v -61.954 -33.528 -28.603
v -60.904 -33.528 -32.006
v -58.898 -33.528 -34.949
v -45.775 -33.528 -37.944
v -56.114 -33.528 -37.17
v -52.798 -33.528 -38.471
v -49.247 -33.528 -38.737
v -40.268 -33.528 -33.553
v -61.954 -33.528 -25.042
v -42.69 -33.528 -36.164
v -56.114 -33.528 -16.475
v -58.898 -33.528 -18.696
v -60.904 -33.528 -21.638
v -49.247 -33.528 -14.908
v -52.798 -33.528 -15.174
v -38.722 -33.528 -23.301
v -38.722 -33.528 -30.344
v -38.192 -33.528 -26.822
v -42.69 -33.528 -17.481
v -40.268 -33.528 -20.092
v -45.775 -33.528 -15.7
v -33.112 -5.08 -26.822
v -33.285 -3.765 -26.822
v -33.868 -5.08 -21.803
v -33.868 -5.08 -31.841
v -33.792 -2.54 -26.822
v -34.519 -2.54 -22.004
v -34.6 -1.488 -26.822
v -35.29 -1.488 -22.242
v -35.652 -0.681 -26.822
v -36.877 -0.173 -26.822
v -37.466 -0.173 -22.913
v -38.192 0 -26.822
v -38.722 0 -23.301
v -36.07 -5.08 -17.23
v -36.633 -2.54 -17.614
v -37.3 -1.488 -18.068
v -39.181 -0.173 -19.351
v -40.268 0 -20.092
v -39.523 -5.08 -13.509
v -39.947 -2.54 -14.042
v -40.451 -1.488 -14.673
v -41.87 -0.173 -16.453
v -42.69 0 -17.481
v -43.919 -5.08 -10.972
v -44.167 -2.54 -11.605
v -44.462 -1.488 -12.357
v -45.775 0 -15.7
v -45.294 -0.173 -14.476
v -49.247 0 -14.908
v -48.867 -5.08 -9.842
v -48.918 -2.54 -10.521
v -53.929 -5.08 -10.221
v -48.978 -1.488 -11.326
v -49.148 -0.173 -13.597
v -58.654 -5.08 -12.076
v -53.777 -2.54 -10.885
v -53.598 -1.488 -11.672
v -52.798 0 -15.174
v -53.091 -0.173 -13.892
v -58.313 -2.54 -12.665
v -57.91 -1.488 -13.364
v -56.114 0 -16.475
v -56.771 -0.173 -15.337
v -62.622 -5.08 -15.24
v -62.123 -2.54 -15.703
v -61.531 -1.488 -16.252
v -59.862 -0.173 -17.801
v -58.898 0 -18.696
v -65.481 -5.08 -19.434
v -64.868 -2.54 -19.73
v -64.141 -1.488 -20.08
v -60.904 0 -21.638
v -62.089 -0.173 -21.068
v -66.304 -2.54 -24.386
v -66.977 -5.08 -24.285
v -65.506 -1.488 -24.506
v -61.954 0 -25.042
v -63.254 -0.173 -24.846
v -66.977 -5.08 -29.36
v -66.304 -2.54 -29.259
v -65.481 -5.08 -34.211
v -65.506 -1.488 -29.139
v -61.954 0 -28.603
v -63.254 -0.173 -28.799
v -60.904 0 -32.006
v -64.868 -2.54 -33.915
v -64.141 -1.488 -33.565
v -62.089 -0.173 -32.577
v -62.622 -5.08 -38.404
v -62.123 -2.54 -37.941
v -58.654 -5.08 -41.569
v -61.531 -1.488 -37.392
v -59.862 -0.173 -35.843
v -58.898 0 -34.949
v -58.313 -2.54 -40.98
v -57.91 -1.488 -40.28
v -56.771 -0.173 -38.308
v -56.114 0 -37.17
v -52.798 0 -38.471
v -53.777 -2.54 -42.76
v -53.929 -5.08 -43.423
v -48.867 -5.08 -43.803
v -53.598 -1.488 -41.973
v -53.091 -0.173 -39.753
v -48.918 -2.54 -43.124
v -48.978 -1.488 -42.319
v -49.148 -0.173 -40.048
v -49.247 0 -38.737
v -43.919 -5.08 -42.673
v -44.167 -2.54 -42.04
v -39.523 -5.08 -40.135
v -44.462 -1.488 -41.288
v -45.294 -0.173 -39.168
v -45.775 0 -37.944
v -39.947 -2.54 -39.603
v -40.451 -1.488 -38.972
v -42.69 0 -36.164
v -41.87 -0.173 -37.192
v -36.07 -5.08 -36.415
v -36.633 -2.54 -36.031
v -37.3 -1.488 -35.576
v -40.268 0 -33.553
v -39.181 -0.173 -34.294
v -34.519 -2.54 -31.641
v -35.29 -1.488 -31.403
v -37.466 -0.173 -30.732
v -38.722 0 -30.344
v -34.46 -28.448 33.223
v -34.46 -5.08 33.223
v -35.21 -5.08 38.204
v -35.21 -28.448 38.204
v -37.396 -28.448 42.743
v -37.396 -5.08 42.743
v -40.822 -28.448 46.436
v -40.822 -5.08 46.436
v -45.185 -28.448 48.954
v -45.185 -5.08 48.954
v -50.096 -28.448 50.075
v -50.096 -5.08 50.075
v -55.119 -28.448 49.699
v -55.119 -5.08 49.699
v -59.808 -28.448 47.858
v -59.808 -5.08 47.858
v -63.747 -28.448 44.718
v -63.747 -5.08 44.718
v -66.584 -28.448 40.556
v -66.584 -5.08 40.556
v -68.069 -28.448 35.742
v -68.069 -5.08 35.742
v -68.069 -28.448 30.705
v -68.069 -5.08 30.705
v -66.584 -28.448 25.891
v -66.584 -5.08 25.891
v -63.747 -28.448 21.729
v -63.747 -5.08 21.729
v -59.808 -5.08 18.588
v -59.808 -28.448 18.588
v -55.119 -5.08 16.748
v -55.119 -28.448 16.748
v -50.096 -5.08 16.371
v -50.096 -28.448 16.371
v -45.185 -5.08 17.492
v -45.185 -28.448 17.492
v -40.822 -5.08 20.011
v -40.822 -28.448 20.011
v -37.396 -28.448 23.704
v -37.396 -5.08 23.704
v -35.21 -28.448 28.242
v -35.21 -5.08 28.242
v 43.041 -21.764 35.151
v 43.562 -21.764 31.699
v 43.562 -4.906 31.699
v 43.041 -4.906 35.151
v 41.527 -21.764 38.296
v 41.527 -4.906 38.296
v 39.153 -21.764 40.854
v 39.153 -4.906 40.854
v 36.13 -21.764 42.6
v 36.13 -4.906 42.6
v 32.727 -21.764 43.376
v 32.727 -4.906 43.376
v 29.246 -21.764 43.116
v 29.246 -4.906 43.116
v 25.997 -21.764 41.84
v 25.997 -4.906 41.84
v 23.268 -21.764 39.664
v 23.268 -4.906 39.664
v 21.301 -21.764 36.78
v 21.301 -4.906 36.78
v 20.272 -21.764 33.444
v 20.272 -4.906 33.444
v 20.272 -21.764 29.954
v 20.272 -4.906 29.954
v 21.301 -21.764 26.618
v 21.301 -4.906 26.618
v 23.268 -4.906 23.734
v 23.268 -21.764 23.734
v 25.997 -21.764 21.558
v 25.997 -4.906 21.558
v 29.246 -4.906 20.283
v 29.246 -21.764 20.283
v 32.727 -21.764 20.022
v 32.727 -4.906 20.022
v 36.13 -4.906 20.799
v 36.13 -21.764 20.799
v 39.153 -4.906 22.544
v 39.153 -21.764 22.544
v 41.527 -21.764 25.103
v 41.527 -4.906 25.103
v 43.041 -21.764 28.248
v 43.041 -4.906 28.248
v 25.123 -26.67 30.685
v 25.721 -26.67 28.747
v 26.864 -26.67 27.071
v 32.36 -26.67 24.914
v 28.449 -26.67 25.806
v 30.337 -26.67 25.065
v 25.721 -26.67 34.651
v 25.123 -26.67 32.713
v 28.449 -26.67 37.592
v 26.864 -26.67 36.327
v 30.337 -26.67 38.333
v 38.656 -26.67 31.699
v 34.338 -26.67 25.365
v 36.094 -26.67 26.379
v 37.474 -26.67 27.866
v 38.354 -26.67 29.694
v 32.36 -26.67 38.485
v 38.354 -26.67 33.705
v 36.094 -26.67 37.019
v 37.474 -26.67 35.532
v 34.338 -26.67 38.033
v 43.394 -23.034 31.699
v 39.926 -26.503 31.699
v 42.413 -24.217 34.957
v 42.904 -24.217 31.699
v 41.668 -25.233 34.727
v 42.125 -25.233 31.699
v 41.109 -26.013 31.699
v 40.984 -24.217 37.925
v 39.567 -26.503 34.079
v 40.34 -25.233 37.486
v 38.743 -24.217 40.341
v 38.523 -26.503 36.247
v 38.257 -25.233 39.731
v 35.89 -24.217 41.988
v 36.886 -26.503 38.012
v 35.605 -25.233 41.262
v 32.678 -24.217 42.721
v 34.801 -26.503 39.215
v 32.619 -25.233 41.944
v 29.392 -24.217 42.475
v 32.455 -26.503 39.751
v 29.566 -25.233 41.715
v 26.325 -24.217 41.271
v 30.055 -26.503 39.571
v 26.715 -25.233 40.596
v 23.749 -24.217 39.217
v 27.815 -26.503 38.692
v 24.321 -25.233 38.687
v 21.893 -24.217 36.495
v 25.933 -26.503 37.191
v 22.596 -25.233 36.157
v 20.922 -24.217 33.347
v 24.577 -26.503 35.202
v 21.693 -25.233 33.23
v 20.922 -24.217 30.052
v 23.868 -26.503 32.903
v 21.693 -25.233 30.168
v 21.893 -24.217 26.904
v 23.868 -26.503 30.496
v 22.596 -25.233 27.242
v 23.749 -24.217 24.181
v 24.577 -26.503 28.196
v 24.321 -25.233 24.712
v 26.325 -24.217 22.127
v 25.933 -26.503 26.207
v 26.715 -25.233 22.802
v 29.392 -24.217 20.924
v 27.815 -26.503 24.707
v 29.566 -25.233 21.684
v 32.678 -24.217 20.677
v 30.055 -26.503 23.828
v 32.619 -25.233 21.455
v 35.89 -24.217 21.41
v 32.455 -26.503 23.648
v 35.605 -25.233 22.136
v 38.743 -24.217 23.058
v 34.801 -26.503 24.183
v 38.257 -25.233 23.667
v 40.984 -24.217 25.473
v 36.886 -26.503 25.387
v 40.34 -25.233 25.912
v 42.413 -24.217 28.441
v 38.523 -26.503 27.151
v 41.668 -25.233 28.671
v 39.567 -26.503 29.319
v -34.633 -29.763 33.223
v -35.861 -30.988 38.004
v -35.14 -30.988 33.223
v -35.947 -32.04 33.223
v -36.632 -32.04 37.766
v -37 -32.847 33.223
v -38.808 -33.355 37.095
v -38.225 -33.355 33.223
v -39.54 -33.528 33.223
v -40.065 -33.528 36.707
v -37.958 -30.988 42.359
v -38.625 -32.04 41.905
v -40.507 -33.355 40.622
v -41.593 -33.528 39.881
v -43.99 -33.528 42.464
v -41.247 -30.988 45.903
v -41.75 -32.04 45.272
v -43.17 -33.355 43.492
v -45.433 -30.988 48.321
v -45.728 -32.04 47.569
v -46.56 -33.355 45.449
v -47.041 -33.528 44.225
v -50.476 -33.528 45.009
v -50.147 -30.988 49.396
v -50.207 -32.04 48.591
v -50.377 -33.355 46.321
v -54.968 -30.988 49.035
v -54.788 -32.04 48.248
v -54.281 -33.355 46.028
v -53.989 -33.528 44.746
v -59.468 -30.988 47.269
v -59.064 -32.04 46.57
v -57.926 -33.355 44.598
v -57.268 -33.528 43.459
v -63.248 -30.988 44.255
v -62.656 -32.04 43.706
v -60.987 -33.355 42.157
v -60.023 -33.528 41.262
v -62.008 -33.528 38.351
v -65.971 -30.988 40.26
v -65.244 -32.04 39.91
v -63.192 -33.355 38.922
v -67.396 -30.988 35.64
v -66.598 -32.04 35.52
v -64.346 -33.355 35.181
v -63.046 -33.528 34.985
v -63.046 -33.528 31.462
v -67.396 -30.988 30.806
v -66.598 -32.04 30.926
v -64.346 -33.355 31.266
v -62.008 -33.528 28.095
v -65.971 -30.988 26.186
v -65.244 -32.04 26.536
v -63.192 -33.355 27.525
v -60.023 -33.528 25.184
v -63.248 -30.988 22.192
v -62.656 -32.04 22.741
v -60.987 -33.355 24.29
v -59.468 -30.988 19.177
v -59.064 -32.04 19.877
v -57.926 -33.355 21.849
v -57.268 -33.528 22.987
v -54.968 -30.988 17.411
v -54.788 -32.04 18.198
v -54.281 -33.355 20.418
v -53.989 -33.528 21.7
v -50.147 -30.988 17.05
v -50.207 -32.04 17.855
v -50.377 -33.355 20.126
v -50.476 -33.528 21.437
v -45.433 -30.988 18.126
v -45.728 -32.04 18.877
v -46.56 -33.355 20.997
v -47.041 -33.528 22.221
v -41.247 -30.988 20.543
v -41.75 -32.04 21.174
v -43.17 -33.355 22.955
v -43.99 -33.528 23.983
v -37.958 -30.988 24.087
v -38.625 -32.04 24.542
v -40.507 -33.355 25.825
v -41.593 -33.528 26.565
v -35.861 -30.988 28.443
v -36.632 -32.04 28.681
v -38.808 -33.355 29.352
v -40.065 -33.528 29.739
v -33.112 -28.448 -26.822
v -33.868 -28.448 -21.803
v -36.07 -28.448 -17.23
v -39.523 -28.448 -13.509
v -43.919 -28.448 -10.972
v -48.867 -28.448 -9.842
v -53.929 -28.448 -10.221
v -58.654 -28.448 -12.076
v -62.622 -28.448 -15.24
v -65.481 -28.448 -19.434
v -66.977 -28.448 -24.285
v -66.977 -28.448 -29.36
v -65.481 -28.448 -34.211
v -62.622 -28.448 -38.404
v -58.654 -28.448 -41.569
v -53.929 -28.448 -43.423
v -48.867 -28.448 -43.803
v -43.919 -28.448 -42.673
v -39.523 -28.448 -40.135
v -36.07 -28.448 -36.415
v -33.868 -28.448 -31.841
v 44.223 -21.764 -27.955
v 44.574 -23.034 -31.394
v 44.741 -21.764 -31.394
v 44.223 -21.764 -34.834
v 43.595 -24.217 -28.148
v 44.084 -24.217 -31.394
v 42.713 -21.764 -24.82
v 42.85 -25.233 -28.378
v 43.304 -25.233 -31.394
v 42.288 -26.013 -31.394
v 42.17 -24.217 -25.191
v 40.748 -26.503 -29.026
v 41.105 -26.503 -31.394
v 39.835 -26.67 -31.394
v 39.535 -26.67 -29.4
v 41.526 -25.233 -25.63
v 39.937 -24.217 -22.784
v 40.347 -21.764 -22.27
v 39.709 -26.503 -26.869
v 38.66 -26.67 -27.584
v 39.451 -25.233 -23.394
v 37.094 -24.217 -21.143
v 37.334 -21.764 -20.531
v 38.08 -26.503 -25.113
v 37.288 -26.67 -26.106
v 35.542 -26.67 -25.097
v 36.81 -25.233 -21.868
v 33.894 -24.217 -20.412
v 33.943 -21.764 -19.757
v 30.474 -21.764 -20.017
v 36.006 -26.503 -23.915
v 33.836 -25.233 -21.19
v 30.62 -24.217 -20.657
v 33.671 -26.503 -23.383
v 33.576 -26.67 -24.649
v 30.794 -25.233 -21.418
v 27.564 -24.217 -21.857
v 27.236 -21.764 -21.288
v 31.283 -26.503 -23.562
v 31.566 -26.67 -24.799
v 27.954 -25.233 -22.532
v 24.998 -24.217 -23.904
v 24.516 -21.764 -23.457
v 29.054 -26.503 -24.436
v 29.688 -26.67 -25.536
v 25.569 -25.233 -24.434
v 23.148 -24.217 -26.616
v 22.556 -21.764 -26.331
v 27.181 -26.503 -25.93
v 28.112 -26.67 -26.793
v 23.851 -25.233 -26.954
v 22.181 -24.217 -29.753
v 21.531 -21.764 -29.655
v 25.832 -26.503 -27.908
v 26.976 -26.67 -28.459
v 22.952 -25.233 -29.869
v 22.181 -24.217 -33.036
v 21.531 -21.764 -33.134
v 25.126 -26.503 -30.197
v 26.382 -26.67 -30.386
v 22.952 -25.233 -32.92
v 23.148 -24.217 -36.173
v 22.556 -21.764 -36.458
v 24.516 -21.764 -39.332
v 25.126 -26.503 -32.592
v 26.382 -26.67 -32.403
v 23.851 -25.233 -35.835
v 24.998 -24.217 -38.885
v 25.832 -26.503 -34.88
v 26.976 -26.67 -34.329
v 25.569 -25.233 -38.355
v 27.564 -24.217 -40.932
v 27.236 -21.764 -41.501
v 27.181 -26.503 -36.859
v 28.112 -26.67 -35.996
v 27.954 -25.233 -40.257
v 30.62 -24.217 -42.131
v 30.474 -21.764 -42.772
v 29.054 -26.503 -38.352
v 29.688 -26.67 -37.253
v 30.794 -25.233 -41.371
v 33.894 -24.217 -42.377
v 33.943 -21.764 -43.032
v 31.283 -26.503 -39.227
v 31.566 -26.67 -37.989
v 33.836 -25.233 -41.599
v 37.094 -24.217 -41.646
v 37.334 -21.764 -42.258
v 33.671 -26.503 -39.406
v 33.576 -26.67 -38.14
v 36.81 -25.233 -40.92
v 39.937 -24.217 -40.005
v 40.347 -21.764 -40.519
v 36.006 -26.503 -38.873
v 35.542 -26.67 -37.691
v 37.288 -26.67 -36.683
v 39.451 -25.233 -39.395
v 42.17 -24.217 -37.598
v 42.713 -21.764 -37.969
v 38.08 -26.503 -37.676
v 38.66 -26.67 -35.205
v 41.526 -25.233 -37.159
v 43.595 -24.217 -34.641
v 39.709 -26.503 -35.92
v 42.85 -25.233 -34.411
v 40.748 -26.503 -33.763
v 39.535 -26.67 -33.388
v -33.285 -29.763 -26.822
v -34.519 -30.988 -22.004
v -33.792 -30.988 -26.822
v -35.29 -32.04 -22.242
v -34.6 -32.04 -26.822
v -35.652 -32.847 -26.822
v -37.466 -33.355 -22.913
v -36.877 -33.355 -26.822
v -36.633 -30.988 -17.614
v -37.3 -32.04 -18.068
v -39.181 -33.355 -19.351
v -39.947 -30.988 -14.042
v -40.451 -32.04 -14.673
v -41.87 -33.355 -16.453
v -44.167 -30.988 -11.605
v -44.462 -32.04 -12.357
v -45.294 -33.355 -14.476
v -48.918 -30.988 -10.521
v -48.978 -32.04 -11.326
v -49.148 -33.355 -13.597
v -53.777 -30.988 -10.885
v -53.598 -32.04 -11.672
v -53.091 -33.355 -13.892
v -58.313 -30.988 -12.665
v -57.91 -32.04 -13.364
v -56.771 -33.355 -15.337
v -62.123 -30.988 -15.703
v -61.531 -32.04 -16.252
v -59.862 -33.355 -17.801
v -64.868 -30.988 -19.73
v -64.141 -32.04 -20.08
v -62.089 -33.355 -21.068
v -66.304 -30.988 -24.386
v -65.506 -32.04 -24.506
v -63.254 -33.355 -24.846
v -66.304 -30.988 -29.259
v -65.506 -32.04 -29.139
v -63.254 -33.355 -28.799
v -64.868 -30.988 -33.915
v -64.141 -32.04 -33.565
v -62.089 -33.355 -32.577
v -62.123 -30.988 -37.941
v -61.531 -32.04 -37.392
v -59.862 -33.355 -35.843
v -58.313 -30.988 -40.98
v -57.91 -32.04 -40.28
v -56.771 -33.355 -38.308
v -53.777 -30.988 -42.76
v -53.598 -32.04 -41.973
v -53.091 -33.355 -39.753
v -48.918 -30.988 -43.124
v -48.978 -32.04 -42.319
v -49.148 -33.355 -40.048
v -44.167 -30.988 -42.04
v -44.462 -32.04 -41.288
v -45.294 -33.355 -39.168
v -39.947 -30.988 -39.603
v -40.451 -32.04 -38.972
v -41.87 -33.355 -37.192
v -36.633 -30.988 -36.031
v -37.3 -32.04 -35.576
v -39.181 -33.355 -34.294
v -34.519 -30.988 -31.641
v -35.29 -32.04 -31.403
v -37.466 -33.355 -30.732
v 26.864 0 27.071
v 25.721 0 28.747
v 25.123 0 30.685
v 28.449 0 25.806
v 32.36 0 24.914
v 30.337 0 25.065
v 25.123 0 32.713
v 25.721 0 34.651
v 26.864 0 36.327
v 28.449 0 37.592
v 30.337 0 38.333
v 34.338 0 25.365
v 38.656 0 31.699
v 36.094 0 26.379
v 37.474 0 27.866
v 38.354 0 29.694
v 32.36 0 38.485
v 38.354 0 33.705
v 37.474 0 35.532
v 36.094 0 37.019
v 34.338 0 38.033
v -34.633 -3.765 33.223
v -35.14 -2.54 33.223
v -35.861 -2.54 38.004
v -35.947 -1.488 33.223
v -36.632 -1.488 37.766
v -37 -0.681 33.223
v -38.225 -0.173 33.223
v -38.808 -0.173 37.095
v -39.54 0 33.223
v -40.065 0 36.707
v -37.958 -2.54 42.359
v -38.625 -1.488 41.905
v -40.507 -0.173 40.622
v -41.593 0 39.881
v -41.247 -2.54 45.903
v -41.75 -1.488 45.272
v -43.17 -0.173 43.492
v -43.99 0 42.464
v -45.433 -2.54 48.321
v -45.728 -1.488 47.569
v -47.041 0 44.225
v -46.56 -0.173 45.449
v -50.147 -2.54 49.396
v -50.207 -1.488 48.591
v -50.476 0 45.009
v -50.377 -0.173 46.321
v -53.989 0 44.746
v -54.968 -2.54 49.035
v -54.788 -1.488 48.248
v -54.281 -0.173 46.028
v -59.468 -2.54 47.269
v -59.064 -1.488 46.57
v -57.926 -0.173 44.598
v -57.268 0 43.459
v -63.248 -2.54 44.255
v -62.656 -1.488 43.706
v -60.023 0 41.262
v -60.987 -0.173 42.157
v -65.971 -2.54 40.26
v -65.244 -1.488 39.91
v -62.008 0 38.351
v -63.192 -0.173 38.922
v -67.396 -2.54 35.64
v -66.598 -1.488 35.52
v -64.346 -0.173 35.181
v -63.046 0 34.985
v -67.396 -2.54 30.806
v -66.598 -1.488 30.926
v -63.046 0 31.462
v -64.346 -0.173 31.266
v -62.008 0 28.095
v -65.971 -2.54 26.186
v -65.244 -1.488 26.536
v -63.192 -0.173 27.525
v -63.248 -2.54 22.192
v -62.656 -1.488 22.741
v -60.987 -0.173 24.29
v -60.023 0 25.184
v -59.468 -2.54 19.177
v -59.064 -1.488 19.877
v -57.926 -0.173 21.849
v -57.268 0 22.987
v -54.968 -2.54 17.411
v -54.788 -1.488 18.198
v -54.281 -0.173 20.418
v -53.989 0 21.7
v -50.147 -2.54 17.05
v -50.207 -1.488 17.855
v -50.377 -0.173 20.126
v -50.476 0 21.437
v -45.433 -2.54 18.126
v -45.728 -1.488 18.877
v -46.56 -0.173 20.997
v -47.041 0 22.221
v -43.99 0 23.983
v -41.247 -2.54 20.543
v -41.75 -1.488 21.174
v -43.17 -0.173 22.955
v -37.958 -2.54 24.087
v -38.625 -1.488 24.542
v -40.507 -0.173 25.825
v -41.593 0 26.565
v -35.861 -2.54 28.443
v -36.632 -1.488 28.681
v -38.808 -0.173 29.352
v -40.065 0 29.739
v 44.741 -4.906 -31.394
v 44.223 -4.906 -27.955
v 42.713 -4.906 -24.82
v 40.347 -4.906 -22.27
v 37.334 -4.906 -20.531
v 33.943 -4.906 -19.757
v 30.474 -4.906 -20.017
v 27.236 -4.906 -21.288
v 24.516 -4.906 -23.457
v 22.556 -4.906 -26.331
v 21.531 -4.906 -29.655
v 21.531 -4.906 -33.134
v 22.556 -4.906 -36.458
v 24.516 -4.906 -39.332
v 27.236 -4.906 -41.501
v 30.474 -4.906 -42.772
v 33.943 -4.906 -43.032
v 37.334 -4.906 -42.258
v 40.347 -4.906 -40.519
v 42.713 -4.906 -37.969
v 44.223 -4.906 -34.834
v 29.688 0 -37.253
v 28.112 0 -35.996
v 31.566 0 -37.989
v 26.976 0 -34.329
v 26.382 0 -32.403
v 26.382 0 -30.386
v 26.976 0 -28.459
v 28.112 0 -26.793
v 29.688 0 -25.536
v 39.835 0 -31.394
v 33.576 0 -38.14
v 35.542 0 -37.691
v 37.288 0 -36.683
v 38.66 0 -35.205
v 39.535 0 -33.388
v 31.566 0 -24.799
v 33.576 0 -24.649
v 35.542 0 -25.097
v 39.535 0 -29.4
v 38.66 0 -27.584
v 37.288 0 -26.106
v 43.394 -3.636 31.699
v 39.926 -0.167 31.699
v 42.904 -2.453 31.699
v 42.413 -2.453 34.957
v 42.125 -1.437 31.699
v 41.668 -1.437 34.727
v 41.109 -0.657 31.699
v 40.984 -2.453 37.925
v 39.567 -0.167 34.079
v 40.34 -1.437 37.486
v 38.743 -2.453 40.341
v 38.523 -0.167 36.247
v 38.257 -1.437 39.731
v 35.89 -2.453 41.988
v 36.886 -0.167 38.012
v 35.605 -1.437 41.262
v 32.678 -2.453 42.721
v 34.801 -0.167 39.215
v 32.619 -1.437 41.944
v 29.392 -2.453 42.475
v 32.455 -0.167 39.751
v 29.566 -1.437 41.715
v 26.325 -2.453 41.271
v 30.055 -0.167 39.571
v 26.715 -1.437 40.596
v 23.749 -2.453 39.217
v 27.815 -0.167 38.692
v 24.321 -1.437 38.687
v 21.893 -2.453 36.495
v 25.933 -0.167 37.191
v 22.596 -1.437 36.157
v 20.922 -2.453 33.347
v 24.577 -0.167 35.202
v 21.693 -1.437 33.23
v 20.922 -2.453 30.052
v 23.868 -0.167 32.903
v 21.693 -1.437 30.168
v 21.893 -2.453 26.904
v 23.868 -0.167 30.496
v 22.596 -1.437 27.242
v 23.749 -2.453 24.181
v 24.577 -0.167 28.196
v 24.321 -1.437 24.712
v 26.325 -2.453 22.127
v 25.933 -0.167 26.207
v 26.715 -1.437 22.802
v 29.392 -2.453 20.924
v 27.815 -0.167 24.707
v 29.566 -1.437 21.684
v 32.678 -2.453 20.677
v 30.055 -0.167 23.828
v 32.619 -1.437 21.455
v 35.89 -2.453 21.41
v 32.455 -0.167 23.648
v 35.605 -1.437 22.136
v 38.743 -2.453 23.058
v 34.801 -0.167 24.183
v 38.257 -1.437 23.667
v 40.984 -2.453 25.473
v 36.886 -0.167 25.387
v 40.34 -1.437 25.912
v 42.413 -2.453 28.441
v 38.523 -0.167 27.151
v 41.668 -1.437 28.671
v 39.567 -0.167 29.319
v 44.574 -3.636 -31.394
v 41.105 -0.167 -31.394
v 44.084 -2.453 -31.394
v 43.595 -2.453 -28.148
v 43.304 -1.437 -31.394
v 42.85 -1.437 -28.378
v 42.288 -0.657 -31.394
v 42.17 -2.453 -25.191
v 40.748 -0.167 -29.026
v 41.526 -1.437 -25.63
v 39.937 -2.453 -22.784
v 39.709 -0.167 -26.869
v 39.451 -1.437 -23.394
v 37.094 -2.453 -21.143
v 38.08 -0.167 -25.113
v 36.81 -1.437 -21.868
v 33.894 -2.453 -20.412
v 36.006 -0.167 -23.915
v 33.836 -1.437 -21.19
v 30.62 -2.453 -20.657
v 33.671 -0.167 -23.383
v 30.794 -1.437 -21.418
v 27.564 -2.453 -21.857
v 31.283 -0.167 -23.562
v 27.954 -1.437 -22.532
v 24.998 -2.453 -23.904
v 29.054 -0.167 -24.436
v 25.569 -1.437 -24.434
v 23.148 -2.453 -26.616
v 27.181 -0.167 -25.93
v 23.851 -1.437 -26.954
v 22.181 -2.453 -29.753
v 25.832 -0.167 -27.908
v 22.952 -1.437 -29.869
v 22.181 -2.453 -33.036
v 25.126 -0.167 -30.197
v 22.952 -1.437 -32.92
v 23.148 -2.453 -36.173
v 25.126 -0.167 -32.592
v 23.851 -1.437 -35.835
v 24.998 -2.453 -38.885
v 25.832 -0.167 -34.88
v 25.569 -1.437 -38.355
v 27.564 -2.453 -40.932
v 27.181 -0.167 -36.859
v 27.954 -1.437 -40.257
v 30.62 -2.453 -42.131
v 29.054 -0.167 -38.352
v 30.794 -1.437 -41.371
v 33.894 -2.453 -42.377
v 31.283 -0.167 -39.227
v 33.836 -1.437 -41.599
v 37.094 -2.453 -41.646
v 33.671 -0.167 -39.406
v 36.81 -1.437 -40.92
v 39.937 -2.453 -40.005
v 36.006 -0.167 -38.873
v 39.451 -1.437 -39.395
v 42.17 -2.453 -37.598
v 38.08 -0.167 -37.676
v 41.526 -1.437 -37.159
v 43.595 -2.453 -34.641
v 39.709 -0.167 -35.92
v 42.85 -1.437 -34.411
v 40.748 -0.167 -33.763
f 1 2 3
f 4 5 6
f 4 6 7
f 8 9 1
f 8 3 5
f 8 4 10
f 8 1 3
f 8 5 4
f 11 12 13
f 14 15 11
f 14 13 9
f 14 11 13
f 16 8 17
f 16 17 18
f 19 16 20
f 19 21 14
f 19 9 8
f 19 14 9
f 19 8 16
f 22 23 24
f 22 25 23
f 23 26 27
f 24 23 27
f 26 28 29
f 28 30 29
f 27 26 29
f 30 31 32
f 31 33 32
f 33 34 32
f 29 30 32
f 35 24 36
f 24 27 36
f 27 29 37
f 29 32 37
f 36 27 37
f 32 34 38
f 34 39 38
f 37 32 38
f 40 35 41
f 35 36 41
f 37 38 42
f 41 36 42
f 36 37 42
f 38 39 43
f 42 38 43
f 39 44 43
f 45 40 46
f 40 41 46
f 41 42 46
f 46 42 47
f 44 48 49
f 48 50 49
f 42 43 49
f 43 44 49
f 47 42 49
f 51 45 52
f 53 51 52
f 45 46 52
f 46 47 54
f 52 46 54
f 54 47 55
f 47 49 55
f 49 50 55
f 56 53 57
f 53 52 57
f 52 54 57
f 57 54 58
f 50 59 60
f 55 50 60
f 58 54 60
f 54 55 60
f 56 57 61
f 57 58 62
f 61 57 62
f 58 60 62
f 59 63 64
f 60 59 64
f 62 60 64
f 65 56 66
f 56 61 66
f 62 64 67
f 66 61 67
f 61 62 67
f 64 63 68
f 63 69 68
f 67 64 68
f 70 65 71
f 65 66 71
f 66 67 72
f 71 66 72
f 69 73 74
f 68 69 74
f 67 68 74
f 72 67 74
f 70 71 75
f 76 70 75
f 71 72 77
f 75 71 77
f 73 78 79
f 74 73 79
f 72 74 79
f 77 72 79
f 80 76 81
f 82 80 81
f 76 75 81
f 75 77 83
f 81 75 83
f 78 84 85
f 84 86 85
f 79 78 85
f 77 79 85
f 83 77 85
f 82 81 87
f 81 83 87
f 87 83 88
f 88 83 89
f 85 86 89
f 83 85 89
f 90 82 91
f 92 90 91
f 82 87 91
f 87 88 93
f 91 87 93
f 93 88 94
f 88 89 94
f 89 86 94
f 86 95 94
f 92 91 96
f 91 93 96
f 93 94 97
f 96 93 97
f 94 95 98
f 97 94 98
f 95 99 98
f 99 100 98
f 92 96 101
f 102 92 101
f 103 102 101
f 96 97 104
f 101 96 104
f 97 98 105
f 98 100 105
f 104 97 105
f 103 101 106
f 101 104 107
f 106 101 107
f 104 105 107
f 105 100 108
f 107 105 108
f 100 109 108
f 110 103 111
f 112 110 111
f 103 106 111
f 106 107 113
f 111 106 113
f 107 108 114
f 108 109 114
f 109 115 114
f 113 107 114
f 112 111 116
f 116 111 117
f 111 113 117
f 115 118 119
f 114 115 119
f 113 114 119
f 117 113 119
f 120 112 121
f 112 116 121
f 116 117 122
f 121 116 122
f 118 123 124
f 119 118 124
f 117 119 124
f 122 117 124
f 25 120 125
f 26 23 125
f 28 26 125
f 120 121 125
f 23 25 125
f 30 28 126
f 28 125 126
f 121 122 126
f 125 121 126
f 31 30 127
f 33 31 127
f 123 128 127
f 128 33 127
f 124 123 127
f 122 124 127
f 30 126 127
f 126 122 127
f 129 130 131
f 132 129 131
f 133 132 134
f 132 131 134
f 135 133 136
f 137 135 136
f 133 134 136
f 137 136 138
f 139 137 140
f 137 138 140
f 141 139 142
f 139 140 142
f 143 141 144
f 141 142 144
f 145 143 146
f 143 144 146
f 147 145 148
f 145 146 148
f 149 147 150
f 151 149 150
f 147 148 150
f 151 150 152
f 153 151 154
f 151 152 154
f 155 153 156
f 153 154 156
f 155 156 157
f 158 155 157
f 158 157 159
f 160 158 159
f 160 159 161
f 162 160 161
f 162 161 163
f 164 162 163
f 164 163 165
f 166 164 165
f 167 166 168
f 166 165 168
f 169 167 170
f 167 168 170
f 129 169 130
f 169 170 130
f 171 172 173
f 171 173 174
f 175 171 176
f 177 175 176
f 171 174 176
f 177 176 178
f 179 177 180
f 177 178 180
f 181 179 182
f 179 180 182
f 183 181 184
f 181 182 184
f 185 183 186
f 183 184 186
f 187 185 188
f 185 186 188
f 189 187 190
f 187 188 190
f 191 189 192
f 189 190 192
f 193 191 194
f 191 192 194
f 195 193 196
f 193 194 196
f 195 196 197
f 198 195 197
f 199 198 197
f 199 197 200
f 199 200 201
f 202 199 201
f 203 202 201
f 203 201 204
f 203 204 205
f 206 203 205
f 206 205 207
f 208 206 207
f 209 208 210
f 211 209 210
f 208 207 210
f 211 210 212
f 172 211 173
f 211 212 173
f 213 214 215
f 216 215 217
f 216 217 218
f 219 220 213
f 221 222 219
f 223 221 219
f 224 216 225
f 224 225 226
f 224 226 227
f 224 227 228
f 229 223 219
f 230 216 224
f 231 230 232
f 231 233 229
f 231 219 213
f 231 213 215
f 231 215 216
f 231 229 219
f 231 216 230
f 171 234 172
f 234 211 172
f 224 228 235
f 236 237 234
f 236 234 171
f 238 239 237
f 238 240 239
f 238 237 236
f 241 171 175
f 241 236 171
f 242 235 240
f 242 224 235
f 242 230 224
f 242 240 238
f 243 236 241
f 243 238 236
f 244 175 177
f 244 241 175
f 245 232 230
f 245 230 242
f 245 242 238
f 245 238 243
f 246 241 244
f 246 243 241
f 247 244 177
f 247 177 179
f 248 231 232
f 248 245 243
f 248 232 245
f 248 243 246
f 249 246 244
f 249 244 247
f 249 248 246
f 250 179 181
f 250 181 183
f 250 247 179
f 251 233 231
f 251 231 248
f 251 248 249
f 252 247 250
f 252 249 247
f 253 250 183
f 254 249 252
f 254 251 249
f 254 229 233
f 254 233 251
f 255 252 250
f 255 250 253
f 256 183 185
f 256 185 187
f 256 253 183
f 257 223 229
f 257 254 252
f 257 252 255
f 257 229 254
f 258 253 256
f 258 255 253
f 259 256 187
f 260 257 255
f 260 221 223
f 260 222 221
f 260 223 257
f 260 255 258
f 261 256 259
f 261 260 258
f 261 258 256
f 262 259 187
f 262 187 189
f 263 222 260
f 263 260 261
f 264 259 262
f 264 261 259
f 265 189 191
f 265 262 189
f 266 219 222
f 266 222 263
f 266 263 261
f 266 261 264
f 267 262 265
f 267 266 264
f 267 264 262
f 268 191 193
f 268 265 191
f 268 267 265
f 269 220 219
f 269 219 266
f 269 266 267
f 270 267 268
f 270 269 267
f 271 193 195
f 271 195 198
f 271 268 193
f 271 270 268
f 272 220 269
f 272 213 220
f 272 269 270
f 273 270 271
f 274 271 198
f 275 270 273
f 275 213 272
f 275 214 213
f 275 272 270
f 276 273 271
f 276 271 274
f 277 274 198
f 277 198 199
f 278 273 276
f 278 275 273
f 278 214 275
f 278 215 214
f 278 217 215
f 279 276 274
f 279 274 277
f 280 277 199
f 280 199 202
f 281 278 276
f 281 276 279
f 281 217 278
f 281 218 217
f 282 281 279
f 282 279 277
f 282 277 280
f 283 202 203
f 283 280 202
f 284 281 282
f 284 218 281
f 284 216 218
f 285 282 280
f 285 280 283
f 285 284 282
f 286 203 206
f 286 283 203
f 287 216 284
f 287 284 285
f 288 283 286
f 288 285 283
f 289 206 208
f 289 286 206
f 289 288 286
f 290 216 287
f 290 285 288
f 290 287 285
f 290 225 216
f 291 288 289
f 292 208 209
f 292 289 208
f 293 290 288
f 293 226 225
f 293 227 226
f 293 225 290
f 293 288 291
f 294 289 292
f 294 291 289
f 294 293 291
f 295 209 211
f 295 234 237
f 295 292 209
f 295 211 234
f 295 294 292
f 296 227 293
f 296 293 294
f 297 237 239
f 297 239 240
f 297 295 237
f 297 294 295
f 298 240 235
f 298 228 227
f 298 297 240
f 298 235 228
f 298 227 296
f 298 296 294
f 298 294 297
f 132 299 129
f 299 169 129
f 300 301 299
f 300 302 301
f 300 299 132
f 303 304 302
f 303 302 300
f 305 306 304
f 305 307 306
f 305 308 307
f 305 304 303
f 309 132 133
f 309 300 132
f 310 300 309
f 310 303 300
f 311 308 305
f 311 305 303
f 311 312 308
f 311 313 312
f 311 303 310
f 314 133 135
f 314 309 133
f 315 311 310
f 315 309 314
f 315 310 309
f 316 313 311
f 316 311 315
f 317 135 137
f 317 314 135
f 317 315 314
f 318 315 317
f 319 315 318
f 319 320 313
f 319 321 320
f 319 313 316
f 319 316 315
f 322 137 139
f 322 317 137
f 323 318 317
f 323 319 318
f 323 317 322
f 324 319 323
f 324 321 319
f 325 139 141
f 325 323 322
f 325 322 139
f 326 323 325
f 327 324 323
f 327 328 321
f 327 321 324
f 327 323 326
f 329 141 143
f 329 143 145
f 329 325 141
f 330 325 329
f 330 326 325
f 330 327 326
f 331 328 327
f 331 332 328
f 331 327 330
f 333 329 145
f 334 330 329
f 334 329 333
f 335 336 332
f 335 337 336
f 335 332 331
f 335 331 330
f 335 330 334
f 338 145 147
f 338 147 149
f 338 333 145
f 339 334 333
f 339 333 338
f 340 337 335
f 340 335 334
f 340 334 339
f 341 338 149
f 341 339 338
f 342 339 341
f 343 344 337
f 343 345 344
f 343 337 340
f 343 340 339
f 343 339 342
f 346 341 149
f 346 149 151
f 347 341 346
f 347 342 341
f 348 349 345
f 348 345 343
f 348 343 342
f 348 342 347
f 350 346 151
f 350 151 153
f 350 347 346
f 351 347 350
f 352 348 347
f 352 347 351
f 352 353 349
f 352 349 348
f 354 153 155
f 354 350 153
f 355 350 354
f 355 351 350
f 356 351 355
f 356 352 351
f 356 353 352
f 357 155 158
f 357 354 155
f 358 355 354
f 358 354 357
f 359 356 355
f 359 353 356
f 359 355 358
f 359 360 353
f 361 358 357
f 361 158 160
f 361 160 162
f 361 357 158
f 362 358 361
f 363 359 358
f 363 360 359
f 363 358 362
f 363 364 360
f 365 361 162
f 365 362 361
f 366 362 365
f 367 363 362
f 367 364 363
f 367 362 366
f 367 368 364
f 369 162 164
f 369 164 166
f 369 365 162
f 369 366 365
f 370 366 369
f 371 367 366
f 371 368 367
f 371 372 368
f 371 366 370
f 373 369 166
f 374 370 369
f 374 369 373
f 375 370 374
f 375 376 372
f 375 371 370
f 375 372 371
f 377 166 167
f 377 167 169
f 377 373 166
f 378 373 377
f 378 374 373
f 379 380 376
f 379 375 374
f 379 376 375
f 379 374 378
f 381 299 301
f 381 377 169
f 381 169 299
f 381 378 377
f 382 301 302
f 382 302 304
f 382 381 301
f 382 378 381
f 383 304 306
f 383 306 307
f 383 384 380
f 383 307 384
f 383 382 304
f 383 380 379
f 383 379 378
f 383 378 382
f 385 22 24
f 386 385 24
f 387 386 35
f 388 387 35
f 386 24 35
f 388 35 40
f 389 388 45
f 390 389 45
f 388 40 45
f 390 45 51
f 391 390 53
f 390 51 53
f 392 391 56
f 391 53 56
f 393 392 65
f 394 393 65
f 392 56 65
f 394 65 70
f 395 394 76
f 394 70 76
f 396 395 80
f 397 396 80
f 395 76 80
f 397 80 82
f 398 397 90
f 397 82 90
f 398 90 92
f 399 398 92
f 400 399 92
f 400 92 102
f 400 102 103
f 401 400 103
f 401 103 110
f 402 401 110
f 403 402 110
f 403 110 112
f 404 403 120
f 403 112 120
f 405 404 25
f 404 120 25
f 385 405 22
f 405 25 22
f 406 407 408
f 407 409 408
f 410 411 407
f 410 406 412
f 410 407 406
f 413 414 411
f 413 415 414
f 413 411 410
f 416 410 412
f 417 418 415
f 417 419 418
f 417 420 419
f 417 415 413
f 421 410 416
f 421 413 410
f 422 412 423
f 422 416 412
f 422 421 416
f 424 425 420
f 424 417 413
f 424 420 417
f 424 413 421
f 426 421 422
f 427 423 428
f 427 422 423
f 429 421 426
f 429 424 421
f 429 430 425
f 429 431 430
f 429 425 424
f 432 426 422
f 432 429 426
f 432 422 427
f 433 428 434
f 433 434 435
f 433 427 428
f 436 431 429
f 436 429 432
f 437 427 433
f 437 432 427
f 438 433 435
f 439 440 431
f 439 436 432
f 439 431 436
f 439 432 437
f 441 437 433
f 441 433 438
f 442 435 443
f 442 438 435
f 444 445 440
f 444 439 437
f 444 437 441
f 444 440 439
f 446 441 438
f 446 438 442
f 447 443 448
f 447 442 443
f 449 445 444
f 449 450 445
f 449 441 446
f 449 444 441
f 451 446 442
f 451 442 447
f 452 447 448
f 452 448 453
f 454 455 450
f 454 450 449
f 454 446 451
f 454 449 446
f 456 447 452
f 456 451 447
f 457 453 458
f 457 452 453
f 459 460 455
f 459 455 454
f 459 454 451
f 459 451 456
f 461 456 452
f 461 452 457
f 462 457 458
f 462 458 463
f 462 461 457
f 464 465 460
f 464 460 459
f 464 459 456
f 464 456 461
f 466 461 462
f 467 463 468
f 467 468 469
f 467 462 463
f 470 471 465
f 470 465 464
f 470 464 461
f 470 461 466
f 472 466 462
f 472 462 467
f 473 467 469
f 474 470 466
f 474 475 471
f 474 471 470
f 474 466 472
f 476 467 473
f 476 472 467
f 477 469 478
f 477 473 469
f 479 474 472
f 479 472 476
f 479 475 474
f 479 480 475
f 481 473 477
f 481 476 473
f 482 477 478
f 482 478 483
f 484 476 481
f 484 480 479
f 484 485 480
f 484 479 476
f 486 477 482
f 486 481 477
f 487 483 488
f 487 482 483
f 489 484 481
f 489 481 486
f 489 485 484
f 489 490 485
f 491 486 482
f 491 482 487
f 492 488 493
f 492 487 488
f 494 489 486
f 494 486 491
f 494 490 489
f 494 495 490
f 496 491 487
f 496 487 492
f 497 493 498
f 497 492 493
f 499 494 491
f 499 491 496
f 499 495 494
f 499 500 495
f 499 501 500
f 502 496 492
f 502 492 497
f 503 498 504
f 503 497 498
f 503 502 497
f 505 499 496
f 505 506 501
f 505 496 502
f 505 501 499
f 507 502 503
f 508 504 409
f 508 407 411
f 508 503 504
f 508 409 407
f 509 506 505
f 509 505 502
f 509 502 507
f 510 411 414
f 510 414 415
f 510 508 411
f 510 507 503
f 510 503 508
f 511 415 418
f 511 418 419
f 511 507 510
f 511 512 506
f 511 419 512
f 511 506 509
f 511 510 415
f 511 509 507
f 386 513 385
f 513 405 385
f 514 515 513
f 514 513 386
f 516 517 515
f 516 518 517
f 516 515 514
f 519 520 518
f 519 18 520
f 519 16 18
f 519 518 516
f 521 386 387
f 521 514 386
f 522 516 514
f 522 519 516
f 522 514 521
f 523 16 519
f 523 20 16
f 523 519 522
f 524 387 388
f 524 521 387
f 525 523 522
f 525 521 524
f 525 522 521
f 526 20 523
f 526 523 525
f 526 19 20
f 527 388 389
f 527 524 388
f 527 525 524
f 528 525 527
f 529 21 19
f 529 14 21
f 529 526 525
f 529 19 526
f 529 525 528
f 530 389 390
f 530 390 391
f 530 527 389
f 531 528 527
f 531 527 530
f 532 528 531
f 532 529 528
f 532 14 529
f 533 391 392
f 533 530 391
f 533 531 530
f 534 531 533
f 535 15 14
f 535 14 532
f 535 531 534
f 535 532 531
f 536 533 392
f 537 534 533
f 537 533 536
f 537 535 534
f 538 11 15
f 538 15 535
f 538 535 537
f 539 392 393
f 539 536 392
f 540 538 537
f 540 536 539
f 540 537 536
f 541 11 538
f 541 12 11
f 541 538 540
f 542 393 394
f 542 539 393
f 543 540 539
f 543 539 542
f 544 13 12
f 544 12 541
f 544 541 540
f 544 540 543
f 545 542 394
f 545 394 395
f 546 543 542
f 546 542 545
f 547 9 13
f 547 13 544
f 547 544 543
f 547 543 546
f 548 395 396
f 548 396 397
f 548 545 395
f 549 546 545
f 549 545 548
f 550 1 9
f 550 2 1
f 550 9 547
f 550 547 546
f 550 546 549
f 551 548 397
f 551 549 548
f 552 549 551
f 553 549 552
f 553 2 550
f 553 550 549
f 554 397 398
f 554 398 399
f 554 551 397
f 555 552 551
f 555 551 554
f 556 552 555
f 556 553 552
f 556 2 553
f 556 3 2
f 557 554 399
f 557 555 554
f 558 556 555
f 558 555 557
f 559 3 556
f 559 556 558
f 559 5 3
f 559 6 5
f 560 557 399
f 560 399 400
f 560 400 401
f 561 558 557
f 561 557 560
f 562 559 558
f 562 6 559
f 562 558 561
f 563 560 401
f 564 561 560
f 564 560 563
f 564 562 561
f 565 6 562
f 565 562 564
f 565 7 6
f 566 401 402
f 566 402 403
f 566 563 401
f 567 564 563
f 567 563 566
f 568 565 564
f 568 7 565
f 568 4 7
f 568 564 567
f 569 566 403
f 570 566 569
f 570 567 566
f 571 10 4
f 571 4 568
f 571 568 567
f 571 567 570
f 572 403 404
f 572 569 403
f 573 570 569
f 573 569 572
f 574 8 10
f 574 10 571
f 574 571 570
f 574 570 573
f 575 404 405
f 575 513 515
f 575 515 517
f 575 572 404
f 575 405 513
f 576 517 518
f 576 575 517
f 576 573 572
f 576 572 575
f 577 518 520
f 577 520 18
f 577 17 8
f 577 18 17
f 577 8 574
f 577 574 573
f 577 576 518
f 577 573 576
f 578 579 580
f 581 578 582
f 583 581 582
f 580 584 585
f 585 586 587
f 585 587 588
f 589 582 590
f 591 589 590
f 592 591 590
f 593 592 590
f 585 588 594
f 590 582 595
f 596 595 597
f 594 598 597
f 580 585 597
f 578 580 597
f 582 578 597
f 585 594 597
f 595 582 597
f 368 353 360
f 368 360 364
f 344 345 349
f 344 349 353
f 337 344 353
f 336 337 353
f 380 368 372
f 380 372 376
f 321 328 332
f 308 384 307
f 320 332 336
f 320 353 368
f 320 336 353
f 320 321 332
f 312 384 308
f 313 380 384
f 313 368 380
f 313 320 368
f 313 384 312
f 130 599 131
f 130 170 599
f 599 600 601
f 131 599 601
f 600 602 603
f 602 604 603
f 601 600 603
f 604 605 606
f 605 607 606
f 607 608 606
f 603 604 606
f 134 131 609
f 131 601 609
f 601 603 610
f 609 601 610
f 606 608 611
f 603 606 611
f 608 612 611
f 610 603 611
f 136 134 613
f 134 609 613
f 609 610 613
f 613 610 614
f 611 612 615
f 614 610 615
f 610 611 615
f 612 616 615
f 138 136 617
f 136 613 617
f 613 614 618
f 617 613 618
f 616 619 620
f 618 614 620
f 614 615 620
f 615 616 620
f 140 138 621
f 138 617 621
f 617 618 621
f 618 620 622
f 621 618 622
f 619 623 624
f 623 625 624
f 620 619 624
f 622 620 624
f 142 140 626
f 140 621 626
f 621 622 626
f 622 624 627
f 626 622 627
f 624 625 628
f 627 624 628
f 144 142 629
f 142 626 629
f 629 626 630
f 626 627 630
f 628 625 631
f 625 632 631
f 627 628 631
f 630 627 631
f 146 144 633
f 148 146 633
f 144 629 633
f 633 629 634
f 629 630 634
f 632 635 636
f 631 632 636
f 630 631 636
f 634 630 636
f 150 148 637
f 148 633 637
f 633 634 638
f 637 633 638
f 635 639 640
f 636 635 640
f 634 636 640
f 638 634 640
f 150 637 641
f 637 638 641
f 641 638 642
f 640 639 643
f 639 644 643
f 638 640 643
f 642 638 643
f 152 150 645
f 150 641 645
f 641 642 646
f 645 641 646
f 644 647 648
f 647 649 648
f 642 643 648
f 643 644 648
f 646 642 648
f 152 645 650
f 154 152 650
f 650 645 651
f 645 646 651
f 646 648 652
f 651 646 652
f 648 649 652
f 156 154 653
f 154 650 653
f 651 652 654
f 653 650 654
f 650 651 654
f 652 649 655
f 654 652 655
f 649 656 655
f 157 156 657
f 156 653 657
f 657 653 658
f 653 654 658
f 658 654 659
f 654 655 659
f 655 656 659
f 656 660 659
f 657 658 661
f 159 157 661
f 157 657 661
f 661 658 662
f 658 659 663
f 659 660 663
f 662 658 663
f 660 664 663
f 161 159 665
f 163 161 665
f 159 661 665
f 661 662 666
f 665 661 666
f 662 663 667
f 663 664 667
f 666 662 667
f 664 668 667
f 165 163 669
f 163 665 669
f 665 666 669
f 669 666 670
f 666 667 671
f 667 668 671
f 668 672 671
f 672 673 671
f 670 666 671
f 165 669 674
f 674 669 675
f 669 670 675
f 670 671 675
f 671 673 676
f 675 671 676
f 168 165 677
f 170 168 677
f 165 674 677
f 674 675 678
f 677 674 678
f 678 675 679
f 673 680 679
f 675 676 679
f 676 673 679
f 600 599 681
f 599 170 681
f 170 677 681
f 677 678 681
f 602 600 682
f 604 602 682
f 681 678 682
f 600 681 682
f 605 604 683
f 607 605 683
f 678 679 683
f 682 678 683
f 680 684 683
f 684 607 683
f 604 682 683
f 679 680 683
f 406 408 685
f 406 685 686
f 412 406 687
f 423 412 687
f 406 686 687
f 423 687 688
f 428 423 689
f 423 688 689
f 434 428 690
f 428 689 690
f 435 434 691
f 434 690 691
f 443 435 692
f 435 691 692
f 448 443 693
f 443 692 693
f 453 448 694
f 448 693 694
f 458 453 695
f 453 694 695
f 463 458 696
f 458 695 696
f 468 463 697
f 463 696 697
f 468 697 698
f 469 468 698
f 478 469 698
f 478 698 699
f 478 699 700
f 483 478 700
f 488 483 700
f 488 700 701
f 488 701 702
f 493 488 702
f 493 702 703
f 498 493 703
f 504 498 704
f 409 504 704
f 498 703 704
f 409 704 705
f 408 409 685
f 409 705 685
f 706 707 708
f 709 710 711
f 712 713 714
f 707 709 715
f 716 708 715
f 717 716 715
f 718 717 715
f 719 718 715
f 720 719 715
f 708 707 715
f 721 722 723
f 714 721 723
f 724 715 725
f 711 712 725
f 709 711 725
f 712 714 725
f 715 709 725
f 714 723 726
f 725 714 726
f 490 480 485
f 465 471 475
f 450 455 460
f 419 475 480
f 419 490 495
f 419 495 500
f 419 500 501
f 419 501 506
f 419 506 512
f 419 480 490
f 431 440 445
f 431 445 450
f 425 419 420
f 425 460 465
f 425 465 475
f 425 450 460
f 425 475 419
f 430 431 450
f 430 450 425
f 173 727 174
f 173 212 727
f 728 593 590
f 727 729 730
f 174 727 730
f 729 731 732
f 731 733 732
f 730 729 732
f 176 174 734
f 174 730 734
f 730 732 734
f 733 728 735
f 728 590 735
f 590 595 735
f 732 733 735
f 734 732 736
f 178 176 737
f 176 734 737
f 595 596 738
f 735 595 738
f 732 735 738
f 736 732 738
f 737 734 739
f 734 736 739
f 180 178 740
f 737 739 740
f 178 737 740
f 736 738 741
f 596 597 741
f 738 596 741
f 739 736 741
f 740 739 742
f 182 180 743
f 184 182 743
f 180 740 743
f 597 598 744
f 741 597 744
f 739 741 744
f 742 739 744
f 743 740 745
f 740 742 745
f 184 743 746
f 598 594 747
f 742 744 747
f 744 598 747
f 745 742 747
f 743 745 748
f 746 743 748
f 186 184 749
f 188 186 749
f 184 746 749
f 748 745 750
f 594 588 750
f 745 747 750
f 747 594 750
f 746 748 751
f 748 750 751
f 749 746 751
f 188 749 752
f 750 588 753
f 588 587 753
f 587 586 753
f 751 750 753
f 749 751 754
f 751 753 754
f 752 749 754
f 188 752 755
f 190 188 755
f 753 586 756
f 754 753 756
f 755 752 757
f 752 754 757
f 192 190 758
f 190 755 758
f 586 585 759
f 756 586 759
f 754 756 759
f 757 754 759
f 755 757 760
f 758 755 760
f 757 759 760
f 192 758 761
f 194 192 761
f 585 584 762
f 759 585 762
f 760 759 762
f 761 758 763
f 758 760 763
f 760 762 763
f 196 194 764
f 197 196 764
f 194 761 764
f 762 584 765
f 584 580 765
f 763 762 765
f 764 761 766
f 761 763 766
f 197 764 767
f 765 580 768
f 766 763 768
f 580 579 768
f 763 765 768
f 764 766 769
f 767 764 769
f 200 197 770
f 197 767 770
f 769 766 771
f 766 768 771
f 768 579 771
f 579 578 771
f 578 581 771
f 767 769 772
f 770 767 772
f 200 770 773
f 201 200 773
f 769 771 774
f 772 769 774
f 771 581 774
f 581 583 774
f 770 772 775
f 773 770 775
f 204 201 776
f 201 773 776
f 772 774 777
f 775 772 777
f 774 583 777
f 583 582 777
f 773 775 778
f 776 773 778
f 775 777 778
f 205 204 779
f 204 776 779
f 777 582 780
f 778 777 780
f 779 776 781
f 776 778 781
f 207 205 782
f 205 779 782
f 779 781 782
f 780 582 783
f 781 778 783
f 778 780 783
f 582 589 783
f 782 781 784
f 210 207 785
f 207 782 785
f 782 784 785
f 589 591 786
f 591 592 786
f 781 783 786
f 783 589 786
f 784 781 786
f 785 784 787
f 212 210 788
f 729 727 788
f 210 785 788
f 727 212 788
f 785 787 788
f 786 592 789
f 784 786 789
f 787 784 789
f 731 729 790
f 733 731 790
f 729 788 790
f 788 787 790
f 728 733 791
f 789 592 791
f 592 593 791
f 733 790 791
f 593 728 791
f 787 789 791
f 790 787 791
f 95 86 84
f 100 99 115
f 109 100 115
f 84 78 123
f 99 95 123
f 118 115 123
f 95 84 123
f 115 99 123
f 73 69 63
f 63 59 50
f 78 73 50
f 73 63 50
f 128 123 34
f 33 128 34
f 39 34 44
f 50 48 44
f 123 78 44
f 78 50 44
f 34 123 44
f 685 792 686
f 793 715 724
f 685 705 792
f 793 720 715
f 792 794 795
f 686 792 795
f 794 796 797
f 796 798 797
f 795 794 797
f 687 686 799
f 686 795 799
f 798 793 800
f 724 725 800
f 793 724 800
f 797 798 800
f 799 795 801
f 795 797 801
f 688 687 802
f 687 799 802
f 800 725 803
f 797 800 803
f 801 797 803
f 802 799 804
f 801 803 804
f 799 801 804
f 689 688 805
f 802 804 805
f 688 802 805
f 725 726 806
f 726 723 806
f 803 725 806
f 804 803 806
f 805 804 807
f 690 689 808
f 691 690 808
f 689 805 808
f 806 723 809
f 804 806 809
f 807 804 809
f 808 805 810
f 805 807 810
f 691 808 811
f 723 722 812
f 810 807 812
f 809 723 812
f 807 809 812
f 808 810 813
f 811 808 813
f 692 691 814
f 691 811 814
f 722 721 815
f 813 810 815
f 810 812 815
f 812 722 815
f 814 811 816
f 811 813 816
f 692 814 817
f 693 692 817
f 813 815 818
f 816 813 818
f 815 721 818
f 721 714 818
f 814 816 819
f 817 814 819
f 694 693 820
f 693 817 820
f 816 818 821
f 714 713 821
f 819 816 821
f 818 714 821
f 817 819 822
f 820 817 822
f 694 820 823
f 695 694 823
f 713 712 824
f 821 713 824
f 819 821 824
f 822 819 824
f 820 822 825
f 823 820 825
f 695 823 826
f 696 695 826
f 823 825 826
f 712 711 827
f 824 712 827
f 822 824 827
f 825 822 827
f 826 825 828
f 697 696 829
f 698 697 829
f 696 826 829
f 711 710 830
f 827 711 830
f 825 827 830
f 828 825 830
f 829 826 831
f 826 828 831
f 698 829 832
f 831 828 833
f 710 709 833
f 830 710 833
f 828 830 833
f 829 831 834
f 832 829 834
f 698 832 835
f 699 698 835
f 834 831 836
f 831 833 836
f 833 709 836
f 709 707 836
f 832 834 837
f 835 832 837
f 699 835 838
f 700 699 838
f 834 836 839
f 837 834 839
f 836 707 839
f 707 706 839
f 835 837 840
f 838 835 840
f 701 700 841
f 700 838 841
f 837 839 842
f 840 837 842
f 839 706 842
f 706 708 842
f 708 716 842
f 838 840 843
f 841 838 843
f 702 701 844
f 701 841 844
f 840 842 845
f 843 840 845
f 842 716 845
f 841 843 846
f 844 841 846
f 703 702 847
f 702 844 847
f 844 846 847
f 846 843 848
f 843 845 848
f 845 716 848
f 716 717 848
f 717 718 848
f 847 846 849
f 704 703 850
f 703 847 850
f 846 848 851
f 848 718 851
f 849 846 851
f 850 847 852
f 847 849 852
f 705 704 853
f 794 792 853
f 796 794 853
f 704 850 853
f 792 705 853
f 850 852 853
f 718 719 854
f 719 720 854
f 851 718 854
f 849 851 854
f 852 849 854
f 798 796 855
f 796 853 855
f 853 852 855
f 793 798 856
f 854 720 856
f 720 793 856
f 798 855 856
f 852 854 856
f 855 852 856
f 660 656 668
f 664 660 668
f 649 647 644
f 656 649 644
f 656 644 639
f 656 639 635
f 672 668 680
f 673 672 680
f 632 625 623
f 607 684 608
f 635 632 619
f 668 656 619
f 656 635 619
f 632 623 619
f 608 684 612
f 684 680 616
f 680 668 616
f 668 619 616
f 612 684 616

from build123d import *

# Parameters (mm, degrees)
F0_R     = 17.027928
F0_R_2   = 16.899231
F1_DEPTH = 33.528
F2_R     = 5.08
F0_R_3   = 11.670301
F0_R_4   = 11.710033
F3_DEPTH = 26.67
F4_R     = 4.905682


with BuildPart() as f1:
    # F0 (on Front) → F1 (new body)
    with BuildSketch(Plane.XZ):
        with Locations((-50.139602, -26.822401)):
            Circle(F0_R)
        with Locations((-51.3588, 33.223201)):
            Circle(F0_R_2)
    extrude(amount=F1_DEPTH)

    # F2
    f2_edges = [f1.edges().sort_by_distance(p)[0] for p in [
        (-68.258031, -33.528, 33.223201),
        (-68.258031, 0, 33.223201),
        (-67.16753, -33.528, -26.822401),
        (-67.16753, 0, -26.822401),
    ]]
    fillet(f2_edges, radius=F2_R)


with BuildPart() as f3:
    # F0 (on Front) → F3 (new body)
    with BuildSketch(Plane.XZ):
        with Locations((33.070803, -31.3944)):
            Circle(F0_R_3)
        with Locations((31.851601, 31.699199)):
            Circle(F0_R_4)
    extrude(amount=F3_DEPTH)

    # F4
    f4_edges = [f3.edges().sort_by_distance(p)[0] for p in [
        (21.400502, 0, -31.3944),
        (21.400502, -26.67, -31.3944),
        (20.141568, -26.67, 31.699199),
        (20.141568, 0, 31.699199),
    ]]
    fillet(f4_edges, radius=F4_R)


solid = Compound([f1.part, f3.part])
